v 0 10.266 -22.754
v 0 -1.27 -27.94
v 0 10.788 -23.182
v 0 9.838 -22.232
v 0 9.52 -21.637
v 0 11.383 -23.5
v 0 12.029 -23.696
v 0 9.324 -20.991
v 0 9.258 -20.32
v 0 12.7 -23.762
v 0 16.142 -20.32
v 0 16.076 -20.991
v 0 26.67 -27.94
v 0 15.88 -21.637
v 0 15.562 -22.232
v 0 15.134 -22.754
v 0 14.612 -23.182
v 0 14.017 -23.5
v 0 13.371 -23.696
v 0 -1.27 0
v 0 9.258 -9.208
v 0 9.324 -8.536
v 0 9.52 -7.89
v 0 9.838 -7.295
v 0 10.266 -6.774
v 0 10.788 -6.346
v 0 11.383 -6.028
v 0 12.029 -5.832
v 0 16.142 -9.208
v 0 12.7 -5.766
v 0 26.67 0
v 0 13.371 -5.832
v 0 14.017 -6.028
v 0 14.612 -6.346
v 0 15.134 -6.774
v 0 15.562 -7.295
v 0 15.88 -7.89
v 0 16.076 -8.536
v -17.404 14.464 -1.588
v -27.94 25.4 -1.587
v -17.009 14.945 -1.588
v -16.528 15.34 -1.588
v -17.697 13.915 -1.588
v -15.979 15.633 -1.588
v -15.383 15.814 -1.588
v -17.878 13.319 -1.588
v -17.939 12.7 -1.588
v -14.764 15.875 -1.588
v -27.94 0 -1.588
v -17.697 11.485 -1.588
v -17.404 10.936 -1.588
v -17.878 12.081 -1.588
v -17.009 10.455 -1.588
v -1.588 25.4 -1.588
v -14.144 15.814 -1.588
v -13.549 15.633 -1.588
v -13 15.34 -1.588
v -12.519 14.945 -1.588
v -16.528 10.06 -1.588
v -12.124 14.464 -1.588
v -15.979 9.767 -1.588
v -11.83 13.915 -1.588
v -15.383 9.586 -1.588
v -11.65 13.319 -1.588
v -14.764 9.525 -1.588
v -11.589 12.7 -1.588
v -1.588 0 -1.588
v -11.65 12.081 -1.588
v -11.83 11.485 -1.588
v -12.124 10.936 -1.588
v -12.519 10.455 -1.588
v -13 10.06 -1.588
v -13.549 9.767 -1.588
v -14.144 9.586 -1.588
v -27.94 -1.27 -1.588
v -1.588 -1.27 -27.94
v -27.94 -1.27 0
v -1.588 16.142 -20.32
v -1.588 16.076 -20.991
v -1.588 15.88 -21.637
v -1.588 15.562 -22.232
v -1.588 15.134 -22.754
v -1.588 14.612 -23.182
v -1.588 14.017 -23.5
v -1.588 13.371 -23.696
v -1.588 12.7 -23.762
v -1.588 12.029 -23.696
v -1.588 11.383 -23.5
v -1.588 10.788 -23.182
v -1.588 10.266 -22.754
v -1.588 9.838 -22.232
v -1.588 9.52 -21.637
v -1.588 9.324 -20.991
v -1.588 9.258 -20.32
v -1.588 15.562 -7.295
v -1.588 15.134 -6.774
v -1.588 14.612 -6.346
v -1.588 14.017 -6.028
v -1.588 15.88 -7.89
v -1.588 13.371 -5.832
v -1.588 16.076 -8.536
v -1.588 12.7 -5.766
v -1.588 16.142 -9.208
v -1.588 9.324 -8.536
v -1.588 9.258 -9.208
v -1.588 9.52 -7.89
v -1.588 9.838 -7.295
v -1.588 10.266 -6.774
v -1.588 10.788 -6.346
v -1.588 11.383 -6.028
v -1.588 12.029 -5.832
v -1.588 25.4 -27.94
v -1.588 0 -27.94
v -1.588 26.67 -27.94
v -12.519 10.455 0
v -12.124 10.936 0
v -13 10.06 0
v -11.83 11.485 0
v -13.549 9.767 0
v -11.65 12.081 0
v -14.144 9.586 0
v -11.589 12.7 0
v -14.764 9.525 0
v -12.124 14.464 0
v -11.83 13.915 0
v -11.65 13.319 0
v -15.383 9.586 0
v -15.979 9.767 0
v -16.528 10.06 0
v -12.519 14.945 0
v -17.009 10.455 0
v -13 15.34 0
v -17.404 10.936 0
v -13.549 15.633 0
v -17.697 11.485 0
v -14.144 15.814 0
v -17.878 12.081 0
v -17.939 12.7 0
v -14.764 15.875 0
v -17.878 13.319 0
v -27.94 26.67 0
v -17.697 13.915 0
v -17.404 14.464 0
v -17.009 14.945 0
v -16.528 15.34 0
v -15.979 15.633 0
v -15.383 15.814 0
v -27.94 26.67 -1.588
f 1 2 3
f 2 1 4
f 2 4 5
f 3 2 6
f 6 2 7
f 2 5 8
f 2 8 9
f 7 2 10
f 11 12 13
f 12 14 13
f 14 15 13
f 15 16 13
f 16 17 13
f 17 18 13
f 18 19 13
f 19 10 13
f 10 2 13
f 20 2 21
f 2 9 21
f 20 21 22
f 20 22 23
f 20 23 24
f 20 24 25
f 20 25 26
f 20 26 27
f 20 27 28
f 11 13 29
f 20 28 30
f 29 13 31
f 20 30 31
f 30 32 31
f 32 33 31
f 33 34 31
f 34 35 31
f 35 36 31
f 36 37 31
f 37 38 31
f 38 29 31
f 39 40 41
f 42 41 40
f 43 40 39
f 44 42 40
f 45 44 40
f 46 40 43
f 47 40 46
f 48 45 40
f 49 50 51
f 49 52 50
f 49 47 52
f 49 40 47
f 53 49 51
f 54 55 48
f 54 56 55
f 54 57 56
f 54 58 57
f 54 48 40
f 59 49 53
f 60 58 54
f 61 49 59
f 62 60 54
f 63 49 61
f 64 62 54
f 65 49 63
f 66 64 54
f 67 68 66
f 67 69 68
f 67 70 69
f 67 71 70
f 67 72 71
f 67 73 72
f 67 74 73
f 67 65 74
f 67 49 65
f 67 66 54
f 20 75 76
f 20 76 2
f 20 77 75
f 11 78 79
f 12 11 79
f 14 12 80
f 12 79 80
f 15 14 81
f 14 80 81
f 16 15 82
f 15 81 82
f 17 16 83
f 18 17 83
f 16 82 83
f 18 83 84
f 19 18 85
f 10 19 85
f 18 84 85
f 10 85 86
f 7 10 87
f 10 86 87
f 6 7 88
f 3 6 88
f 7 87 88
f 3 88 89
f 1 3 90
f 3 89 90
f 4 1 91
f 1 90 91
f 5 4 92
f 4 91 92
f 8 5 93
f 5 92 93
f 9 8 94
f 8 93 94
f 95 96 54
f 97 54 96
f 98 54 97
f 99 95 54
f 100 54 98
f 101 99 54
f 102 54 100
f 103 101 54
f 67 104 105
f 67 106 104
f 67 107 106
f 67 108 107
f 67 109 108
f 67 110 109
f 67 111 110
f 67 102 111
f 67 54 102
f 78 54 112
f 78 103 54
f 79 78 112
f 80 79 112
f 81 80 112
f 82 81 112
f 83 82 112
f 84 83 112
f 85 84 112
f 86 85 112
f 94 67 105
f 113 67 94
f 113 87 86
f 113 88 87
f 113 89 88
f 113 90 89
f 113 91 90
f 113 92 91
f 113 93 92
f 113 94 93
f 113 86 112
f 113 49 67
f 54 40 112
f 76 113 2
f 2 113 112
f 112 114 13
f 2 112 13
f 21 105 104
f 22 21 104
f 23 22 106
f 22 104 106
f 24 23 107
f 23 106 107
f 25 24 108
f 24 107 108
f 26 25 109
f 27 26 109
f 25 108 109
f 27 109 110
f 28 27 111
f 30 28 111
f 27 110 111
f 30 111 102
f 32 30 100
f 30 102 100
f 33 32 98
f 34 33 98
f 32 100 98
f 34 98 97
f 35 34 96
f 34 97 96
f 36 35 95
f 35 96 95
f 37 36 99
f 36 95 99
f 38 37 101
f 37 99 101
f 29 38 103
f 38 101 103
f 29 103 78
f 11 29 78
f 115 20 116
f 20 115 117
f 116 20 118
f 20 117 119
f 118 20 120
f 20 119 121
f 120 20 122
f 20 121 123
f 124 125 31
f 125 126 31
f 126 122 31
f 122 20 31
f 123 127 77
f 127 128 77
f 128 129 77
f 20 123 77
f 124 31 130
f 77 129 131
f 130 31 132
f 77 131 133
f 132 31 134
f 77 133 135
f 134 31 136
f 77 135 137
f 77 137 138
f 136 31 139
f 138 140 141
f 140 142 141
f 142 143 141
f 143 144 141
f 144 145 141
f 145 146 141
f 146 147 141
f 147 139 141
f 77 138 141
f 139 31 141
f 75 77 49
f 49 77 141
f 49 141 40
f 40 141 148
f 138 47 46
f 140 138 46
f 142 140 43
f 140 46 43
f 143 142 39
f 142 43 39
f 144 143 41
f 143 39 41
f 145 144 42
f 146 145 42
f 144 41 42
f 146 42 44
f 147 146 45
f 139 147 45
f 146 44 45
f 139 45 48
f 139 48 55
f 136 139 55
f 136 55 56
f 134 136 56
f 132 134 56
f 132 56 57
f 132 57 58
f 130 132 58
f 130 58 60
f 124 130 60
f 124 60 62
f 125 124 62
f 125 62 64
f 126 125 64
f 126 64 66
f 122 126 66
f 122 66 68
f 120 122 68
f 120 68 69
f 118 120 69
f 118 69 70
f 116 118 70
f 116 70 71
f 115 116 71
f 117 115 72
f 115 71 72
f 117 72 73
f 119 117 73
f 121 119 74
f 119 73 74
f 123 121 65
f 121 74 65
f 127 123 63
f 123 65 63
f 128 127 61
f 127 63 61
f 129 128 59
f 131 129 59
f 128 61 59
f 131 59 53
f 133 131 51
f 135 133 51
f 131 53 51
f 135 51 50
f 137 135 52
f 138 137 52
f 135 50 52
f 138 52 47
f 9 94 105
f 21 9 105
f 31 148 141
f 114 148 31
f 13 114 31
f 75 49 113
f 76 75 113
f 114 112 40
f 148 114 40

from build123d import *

# Parameters (mm, degrees)
BOSS_EXTRUDE1_DEPTH = 25.4
BOSS_EXTRUDE2_DEPTH = 1.27
BOSS_EXTRUDE3_DEPTH = 1.27
CUT_EXTRUDE1_DEPTH  = 47.758814744
SKETCH5_R           = 3.175
CUT_EXTRUDE2_DEPTH  = 47.758814744


with BuildPart() as part:
    # Sketch1 → Boss-Extrude1 (new body)
    with BuildSketch(Plane(origin=(0, 0, 0), x_dir=(1, 0, 0), z_dir=(0, 1, 0))):
        Polygon((-27.94, 1.5875), (-1.5875, 1.5875), (-1.5875, 27.94), (0, 27.94), (0, 0), (-27.94, 0), align=None)
    extrude(amount=BOSS_EXTRUDE1_DEPTH)

    # Sketch2 → Boss-Extrude2 (add)
    with BuildSketch(Plane(origin=(0, 25.4, 0), x_dir=(1, 0, 0), z_dir=(0, 1, 0))):
        Polygon((-1.5875, 27.94), (-27.94, 1.5875), (-27.94, 0), (0, 0), (0, 27.94), align=None)
    extrude(amount=BOSS_EXTRUDE2_DEPTH)

    # Sketch3 → Boss-Extrude3 (add)
    with BuildSketch(Plane.XZ):
        Polygon((-27.94, -1.5875), (-1.5875, -27.94), (0, -27.94), (0, 0), (-27.94, 0), align=None)
    extrude(amount=BOSS_EXTRUDE3_DEPTH)

    # Sketch4 → Cut-Extrude1 (cut, through all)
    with BuildSketch(Plane.ZY.offset(1.5875)):
        with BuildLine():
            Line((-20.32, 9.2583), (-9.2075, 9.2583))
            ThreePointArc((-9.2075, 9.2583), (-5.7658, 12.7), (-9.2075, 16.1417))
            Line((-9.2075, 16.1417), (-20.32, 16.1417))
            ThreePointArc((-20.32, 16.1417), (-23.7617, 12.7), (-20.32, 9.2583))
        make_face()
    extrude(amount=-CUT_EXTRUDE1_DEPTH, mode=Mode.SUBTRACT)

    # Sketch5 → Cut-Extrude2 (cut, through all)
    with BuildSketch(Plane(origin=(0, 0, -1.5875), x_dir=(-1, 0, 0), z_dir=(0, 0, -1))):
        with Locations((14.76375, 12.7)):
            Circle(SKETCH5_R)
    extrude(amount=-CUT_EXTRUDE2_DEPTH, mode=Mode.SUBTRACT)


solid = part.part
